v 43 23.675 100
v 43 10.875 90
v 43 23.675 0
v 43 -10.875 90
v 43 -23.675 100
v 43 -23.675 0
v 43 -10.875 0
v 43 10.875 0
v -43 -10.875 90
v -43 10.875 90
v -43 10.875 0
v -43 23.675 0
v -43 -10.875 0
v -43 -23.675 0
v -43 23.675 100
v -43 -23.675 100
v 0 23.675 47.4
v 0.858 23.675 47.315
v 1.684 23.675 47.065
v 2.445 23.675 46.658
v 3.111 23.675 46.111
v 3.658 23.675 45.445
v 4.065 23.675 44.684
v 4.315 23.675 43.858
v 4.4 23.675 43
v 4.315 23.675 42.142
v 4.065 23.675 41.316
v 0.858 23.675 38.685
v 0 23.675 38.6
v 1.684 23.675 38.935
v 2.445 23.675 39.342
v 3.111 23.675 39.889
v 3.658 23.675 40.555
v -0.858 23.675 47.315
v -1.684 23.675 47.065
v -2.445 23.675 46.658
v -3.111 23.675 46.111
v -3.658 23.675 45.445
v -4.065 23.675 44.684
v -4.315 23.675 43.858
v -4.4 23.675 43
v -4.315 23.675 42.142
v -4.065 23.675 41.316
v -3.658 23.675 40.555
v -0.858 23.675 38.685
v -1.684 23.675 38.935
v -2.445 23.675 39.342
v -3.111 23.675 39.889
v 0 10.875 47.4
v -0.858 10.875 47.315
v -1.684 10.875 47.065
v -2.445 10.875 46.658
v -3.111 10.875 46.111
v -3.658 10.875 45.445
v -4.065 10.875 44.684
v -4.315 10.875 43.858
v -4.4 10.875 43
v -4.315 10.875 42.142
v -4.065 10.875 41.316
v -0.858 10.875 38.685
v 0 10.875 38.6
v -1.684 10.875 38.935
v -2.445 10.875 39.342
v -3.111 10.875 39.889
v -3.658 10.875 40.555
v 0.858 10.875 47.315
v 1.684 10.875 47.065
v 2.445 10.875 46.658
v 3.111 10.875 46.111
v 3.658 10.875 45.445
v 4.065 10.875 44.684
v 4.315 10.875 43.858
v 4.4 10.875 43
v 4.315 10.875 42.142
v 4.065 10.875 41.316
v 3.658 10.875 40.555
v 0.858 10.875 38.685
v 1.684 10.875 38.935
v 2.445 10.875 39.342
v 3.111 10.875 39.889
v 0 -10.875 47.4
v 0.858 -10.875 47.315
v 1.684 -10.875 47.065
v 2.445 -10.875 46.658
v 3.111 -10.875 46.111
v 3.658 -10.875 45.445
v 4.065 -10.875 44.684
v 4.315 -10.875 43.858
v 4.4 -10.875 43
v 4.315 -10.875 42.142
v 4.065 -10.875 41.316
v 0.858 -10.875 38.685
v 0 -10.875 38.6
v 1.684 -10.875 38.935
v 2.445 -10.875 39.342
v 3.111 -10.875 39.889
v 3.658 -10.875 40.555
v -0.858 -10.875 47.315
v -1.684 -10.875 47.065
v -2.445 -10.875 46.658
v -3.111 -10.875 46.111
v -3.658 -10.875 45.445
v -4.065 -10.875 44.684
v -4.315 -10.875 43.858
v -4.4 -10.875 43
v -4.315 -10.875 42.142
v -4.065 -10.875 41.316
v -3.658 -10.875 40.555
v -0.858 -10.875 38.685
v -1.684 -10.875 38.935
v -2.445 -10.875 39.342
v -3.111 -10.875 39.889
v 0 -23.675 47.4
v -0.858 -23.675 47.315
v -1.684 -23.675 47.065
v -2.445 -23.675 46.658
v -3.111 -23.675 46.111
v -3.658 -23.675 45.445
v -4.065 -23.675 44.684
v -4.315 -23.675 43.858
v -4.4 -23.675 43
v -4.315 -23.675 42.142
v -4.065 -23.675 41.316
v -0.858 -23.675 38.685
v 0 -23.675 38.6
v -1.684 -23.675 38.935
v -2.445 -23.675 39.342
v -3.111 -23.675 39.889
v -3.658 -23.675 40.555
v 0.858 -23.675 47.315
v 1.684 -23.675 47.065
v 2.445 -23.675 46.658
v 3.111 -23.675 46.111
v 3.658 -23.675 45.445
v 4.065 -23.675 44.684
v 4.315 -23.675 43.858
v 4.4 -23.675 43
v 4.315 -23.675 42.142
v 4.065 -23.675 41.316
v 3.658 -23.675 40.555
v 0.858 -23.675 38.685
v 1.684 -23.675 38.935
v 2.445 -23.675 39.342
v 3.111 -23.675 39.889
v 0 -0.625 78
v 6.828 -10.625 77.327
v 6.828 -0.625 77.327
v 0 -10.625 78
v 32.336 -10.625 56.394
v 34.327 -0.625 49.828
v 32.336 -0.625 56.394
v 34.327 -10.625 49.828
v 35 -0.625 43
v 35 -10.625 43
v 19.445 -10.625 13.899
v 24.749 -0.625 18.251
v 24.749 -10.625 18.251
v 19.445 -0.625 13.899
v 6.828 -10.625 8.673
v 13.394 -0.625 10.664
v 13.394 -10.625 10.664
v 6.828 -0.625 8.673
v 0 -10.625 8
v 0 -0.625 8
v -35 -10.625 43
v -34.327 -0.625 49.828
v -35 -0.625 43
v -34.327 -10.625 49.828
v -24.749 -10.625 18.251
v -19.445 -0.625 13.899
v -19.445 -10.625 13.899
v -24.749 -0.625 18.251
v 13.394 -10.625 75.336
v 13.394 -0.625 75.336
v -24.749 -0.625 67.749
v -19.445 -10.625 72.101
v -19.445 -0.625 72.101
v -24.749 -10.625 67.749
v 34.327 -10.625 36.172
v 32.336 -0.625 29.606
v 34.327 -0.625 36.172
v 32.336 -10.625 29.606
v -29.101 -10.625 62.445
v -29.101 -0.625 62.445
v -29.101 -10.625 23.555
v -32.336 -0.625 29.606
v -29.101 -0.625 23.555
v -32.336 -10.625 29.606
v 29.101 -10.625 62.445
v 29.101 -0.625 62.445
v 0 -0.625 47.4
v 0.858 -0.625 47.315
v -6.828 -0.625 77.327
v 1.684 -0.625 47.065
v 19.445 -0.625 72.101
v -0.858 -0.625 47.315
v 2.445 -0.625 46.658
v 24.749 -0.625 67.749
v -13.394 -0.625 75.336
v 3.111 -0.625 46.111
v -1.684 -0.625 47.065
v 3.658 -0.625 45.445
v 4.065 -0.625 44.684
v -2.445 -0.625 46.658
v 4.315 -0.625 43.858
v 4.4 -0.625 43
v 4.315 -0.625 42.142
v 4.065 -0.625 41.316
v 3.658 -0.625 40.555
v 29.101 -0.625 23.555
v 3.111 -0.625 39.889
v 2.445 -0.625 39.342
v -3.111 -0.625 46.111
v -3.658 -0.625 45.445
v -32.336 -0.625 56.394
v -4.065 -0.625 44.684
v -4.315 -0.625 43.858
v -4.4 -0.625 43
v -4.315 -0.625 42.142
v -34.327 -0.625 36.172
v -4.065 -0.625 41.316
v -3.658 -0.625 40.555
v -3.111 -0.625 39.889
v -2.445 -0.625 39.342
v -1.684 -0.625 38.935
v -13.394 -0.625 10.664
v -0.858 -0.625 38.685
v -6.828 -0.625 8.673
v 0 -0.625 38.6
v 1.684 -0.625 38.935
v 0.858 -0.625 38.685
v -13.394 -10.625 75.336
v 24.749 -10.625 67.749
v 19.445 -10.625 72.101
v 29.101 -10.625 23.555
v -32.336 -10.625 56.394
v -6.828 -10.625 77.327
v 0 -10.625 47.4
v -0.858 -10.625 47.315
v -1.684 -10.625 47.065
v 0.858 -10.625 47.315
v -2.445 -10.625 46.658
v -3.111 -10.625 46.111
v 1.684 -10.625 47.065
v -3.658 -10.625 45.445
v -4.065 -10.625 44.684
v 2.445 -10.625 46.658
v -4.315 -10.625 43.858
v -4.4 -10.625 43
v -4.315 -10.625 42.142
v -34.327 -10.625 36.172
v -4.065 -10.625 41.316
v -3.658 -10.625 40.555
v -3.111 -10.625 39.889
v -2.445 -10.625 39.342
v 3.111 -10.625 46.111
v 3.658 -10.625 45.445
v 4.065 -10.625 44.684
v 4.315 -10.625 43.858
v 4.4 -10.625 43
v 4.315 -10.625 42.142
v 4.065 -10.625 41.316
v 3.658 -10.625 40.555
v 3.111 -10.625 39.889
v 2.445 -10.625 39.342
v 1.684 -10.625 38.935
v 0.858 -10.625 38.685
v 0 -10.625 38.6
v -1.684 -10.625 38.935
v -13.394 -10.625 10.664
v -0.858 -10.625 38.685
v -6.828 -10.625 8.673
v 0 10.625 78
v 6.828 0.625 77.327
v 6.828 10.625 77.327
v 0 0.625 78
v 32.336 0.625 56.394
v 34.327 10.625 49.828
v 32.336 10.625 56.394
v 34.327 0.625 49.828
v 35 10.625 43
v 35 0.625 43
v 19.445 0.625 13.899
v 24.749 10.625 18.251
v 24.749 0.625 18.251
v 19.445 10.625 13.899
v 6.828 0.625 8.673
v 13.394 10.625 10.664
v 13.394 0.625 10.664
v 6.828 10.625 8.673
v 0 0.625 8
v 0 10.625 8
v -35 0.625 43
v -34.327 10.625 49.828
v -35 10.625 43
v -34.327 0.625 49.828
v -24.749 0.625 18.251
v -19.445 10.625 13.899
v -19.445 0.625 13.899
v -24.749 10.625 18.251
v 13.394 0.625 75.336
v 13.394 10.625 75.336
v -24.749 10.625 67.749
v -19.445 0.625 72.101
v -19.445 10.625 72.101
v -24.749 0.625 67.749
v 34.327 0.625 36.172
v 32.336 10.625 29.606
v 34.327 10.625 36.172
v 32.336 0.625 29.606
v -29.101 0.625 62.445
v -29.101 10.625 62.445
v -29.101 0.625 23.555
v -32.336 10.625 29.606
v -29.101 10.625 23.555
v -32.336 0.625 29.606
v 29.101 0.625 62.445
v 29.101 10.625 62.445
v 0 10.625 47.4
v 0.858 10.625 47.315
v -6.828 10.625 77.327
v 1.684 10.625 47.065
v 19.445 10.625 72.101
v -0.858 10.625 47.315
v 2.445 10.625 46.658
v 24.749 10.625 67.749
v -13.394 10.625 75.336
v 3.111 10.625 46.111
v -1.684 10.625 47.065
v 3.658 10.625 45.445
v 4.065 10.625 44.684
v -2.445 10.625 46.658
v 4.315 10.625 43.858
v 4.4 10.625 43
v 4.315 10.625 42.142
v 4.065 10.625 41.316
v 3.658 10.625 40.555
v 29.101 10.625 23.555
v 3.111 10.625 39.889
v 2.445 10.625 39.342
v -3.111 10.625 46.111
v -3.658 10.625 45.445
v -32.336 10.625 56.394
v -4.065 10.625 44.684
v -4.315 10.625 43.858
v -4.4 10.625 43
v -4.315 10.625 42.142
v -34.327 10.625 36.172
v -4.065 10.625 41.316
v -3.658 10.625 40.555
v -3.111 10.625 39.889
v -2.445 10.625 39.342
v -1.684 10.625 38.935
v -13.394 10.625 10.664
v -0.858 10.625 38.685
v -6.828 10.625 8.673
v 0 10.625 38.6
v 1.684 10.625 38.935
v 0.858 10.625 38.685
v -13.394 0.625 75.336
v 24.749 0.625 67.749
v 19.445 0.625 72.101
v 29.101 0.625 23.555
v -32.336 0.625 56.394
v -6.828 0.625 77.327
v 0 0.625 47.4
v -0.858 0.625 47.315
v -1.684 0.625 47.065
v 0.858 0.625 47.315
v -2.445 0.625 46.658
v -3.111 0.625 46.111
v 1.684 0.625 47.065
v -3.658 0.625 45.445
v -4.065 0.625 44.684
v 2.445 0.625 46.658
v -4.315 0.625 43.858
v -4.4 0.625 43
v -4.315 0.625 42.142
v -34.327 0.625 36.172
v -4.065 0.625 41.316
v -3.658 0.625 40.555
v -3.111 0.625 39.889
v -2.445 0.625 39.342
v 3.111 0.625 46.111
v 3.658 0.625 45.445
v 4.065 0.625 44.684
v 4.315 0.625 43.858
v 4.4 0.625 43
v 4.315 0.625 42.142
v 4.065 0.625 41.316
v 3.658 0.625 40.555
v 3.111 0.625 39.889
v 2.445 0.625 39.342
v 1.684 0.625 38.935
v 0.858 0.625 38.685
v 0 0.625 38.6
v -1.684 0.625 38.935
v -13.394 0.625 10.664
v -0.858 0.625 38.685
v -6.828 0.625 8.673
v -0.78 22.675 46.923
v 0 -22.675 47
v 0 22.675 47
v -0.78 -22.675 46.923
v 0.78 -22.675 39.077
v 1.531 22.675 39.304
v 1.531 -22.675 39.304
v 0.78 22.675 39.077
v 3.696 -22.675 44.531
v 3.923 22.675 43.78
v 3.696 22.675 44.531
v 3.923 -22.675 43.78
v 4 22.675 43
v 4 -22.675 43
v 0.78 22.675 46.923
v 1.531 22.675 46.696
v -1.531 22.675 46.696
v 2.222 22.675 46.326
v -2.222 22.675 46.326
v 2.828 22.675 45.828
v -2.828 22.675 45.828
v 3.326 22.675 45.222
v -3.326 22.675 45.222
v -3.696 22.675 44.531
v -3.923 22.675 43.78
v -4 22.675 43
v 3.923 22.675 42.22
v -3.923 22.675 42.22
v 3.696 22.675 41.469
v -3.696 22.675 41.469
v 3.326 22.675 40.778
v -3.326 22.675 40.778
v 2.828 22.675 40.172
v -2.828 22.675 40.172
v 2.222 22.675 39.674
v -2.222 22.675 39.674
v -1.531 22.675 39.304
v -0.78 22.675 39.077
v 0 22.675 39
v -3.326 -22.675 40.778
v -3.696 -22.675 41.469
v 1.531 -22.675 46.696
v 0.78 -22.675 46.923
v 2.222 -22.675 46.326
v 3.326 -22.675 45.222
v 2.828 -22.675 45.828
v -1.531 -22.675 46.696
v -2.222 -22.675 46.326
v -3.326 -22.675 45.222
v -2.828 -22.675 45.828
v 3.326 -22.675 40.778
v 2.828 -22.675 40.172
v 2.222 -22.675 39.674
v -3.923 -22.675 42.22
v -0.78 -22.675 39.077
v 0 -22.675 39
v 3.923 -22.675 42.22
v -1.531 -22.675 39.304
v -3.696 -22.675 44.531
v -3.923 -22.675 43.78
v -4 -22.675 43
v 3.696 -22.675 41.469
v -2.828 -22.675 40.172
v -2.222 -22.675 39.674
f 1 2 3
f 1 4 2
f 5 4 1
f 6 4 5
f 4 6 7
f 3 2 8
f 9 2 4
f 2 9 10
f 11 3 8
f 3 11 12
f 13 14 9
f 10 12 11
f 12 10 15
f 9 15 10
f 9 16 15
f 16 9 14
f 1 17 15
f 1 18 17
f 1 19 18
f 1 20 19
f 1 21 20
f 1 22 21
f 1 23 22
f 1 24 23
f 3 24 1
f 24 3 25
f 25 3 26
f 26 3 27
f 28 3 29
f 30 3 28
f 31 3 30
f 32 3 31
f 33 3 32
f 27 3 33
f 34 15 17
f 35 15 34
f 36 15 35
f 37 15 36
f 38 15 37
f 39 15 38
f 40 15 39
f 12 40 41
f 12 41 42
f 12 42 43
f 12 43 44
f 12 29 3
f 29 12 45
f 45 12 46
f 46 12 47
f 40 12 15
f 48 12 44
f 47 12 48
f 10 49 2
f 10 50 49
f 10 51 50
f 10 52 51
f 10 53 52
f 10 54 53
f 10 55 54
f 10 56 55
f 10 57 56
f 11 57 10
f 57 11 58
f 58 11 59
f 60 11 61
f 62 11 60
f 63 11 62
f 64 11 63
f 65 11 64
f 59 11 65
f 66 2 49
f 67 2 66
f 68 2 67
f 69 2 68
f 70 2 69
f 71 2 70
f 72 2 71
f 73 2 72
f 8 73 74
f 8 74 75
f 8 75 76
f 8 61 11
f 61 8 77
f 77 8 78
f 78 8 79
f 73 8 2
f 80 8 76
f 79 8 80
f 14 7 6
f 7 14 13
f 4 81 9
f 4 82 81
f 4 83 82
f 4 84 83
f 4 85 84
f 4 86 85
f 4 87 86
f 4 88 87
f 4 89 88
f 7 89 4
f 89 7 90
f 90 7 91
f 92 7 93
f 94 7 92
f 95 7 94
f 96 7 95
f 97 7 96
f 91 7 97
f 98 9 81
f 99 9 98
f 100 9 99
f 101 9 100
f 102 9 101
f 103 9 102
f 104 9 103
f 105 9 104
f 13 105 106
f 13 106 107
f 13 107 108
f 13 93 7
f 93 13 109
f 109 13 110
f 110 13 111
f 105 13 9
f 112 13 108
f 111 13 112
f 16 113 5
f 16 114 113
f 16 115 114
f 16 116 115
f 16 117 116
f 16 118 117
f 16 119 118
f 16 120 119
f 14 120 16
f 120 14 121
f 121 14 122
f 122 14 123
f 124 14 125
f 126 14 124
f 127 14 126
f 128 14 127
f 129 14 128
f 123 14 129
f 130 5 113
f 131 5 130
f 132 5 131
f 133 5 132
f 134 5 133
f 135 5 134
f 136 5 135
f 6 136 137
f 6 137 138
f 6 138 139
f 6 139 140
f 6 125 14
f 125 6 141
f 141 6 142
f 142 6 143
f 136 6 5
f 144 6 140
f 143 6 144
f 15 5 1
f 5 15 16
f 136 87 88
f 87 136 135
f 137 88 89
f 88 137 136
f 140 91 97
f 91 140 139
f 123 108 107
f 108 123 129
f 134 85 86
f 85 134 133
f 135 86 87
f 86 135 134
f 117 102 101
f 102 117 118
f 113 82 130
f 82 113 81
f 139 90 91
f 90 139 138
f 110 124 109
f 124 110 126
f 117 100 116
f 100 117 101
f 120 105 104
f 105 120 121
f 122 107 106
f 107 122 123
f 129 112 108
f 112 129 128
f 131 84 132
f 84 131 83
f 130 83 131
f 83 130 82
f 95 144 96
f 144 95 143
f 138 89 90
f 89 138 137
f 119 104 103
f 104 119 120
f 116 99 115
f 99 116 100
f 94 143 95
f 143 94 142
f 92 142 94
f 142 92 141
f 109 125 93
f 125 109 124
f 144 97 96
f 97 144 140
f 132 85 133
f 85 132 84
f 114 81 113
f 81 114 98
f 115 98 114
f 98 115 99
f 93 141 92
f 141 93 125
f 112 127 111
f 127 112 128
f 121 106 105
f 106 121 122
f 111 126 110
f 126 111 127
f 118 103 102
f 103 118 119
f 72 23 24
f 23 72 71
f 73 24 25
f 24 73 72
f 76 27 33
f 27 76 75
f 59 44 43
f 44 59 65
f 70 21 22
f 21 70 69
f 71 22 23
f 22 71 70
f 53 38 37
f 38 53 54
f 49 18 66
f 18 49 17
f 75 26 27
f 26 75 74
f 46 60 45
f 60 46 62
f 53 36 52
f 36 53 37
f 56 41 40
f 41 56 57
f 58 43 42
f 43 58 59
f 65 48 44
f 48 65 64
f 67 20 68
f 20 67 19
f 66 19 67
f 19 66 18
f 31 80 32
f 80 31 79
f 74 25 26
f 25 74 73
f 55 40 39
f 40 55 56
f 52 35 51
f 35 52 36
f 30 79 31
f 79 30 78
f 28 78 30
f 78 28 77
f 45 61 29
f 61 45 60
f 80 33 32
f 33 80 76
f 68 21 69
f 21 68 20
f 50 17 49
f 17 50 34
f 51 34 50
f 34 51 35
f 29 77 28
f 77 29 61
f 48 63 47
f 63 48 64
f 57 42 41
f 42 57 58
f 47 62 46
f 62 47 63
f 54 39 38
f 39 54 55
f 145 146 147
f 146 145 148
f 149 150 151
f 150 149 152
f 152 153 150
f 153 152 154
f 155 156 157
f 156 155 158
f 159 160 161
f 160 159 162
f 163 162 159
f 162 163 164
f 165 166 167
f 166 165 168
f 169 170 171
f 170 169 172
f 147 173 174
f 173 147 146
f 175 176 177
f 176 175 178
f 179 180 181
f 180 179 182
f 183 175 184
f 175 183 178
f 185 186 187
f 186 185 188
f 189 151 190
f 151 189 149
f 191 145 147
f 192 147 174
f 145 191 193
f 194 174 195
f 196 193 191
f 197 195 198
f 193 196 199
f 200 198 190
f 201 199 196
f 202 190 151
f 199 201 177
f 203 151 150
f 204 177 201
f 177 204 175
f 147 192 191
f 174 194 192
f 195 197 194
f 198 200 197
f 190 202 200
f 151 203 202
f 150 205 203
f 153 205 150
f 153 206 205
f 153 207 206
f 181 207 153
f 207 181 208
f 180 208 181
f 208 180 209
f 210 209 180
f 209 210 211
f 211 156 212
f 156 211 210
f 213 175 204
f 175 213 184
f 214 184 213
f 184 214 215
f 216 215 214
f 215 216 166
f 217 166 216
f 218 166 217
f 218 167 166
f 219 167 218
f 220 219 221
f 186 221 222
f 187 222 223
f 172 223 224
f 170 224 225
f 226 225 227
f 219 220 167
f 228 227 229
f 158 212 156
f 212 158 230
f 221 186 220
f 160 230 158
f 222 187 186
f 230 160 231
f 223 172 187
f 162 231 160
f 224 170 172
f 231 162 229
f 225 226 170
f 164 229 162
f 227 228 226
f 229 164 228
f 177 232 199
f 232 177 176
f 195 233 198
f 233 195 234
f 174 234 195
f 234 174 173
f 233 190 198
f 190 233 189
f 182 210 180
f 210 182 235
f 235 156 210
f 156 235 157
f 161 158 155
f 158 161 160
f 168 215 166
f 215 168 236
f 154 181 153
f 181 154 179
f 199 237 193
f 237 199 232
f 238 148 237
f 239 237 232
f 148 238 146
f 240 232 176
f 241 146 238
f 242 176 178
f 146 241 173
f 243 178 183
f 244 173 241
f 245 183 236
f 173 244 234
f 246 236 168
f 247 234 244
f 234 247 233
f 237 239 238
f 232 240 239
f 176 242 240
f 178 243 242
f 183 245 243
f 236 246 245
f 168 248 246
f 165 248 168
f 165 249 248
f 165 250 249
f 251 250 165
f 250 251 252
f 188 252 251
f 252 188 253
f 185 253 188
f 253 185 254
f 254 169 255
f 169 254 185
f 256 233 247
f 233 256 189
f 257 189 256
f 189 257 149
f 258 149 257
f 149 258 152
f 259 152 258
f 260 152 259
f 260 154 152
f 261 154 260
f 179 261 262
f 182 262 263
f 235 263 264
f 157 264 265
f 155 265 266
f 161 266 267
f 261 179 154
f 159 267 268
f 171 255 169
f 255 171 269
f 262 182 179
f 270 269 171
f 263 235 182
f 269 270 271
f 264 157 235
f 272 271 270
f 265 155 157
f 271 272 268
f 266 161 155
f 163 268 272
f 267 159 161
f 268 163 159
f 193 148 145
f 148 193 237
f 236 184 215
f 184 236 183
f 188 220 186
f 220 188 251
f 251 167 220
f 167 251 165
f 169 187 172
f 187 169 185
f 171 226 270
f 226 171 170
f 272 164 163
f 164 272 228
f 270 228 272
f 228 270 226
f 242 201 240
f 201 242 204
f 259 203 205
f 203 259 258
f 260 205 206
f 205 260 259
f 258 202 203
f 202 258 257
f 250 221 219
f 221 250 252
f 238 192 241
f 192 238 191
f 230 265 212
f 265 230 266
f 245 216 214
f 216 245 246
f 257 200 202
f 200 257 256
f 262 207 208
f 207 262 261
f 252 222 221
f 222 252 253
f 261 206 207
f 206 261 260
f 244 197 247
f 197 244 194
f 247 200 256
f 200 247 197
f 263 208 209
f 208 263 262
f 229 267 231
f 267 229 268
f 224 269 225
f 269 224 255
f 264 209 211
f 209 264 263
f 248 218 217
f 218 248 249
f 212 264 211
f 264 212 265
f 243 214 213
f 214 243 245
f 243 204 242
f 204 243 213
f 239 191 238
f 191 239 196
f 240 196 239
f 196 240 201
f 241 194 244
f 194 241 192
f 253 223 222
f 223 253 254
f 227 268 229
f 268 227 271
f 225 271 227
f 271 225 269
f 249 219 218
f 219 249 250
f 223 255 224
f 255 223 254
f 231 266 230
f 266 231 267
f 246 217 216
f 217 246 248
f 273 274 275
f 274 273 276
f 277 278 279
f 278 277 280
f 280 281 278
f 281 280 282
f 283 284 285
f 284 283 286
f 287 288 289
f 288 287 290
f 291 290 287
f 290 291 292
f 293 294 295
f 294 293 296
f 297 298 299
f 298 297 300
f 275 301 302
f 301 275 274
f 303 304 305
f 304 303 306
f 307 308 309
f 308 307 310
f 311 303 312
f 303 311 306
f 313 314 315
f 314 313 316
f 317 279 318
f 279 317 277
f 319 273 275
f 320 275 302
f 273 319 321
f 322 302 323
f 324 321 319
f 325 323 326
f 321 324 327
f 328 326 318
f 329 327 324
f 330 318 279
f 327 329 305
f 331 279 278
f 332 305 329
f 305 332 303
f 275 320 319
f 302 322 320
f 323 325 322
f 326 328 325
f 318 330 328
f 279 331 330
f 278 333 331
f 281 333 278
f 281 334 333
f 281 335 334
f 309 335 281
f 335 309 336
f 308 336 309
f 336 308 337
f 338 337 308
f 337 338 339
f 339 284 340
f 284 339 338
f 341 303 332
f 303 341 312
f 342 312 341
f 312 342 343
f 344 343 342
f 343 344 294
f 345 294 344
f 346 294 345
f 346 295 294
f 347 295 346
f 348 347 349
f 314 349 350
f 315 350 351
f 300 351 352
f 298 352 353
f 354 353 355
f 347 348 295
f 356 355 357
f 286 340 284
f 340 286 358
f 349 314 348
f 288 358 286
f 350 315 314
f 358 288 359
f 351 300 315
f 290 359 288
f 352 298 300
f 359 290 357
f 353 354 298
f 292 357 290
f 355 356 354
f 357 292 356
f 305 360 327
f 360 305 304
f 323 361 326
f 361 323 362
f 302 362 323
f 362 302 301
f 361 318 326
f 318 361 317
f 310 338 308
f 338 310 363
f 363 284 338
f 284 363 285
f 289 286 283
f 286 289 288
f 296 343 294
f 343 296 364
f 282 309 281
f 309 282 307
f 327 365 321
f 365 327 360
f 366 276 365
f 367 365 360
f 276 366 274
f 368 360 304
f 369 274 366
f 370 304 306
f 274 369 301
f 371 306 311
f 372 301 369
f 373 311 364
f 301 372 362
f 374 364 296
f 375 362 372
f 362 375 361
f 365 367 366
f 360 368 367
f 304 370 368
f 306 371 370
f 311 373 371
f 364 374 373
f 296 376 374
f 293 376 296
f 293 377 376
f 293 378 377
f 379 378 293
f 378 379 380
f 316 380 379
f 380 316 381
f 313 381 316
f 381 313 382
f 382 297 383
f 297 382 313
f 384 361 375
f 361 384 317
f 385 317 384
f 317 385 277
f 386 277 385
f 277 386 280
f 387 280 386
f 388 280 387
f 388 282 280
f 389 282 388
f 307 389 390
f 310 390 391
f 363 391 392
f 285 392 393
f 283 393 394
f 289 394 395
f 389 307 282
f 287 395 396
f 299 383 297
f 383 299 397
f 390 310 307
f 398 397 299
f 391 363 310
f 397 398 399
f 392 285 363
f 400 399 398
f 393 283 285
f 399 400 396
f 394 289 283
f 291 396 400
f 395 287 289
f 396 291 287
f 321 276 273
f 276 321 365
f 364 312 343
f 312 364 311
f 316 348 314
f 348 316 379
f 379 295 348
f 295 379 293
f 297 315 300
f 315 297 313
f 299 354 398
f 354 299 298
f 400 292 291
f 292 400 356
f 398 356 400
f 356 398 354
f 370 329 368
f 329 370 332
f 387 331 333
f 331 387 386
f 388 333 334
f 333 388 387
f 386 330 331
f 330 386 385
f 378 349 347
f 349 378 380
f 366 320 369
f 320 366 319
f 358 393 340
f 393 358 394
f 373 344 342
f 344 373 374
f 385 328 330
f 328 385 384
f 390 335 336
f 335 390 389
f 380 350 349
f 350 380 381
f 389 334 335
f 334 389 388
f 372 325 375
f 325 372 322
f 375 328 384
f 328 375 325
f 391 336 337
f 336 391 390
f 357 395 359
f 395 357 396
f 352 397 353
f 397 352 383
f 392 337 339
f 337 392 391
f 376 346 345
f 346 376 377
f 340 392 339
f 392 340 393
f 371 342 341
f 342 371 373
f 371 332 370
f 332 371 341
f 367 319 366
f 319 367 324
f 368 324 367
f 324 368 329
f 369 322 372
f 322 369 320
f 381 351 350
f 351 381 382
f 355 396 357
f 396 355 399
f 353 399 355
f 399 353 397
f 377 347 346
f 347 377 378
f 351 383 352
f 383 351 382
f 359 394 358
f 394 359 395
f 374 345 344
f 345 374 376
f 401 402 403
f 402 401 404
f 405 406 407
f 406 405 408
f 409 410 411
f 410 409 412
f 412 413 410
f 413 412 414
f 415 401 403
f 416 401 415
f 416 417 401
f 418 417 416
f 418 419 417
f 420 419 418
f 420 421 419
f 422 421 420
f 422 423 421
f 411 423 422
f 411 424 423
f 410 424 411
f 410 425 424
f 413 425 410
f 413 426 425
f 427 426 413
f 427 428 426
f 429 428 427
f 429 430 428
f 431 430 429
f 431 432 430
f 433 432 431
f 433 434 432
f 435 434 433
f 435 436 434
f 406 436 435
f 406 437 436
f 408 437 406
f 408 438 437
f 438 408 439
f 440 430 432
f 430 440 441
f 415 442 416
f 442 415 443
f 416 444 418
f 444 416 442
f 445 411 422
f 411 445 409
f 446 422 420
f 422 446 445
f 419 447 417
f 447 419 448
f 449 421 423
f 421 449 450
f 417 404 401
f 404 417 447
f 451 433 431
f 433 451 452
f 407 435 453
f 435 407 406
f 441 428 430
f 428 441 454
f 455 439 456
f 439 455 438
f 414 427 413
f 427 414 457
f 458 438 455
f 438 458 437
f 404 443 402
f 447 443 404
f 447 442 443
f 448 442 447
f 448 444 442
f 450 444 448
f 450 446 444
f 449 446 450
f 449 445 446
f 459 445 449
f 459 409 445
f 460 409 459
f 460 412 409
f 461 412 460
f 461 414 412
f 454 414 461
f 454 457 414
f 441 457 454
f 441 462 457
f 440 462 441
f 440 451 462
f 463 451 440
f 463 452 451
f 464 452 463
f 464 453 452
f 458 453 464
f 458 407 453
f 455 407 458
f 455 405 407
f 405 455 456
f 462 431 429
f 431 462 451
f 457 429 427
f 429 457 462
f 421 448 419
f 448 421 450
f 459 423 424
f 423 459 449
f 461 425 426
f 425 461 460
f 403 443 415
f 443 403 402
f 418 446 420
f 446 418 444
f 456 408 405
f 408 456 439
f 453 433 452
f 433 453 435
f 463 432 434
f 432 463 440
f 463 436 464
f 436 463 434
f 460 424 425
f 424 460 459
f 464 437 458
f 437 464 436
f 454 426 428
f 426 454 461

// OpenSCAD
$fn = 32;

// ------------------------------------------------------------------------
// Trolley wheel set: wheels d70, fork 90 mm tall
// Every part is its own module, assembly() places every instance.
// ------------------------------------------------------------------------

// --- part 1 ---
module trolley_fork() {
  difference() {
    union() {
      translate([-43, 10.875, 0]) cube([86, 12.8, 90]);
      translate([-43, -23.675, 0]) cube([86, 12.8, 90]);
      translate([-43, -23.675, 90]) cube([86, 47.35, 10]);
    }
    translate([0, -17.275, 43]) rotate([90, 0, 0]) cylinder(h = 14.8, d = 8.8, center = true);
    translate([0, 17.275, 43]) rotate([90, 0, 0]) cylinder(h = 14.8, d = 8.8, center = true);
  }
}

// --- part 2 ---
module trolley_wheel() {
  difference() {
      translate([0, 0, 0]) cylinder(h = 10, d = 70);
      translate([0, 0, -1]) cylinder(h = 12, d = 8.8);
    }
}

// --- part 3 ---
module trolley_axle() {
  translate([0, 0, -22.675]) cylinder(h = 45.35, d = 8);
}

// --- assembly ---
module assembly() {
  color([0.80, 0.24, 0.20]) translate([0, 0, 0]) rotate([0, 0, 0]) trolley_fork();
  color([0.20, 0.45, 0.75]) translate([0, -0.625, 43]) rotate([90, 0, 0]) trolley_wheel();
  color([0.25, 0.62, 0.32]) translate([0, 10.625, 43]) rotate([90, 0, 0]) trolley_wheel();
  color([0.92, 0.70, 0.18]) translate([0, 0, 43]) rotate([90, 0, 0]) trolley_axle();
}

assembly();
